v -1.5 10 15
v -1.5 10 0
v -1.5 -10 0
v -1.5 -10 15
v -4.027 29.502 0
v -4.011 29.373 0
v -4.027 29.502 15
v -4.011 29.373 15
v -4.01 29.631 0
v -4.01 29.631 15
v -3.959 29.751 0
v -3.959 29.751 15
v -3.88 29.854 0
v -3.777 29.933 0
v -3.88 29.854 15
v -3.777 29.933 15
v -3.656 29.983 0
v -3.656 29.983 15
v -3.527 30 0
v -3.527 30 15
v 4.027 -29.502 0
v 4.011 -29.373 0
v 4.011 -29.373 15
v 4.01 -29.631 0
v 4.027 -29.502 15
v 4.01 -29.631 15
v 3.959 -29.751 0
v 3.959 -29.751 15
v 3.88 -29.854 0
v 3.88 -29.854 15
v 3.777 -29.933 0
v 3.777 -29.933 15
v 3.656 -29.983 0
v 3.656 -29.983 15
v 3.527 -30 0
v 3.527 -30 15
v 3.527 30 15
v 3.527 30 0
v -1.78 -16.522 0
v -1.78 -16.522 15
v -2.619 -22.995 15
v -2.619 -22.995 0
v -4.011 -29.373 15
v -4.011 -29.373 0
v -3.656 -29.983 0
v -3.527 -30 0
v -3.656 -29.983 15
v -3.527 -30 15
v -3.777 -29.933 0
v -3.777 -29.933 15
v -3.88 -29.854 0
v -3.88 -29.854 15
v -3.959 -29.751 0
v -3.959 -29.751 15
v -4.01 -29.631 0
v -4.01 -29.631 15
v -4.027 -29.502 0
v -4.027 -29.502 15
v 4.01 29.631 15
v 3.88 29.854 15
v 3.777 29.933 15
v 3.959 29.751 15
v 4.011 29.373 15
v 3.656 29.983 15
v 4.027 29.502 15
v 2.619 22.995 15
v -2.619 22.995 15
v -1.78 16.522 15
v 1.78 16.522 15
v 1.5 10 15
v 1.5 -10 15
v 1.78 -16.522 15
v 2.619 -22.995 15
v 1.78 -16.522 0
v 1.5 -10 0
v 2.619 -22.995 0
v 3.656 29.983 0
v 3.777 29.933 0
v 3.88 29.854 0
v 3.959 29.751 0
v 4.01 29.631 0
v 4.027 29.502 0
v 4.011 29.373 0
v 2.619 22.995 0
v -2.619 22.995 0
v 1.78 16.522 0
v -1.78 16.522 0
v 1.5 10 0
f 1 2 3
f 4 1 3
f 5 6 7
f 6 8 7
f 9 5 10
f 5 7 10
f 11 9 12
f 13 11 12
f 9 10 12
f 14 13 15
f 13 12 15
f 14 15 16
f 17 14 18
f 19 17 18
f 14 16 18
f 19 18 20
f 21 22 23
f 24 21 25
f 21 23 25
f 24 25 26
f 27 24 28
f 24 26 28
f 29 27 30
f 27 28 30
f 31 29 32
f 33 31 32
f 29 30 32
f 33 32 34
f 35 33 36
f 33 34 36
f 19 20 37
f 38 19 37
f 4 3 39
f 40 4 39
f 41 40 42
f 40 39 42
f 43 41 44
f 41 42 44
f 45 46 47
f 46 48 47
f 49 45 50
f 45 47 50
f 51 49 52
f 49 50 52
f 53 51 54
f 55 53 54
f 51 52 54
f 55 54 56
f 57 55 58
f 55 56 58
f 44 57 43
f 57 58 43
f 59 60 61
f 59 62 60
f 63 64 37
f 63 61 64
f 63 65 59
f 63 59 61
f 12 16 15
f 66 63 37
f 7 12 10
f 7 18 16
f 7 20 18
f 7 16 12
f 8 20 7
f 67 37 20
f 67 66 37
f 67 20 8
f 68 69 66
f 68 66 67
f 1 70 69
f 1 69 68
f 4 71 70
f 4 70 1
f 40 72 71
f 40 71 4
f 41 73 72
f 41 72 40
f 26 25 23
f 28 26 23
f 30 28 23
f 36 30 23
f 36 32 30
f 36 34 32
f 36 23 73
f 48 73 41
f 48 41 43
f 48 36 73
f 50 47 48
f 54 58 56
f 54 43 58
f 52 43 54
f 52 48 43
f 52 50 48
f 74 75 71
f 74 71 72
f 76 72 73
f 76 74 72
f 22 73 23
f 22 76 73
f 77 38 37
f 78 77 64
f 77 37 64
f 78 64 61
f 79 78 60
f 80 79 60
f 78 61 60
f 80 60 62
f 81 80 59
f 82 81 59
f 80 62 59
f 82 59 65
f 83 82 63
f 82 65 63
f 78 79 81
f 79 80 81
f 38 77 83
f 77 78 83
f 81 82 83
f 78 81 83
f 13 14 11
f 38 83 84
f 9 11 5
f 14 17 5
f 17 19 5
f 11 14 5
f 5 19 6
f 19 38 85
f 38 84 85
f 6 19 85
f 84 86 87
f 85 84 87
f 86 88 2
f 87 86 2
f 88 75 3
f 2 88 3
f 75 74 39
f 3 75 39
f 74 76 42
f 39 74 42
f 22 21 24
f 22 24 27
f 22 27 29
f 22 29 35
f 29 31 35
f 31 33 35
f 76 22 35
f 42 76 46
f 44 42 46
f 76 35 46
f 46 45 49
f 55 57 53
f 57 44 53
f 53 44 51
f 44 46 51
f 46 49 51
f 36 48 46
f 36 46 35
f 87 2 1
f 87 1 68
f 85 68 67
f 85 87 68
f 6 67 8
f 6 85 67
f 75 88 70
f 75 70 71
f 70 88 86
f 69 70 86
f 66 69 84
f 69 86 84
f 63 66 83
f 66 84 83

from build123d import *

# Parameters (mm, degrees)
BOSS_EXTRUDE1_DEPTH = 15
FILLET1_R           = 0.5


with BuildPart() as part:
    # Sketch1 → Boss-Extrude1 (new body)
    with BuildSketch(Plane.XY):
        with BuildLine():
            Line((0, 0), (1.5, 0))
            Line((1.5, 0), (1.5, 10))
            ThreePointArc((1.5, 10), (2.172674131, 20.089300148), (4.178788881, 30))
            Line((4.178788881, 30), (0, 30))
            Line((0, 30), (0, 0))
        make_face()
    boss_extrude1 = extrude(amount=BOSS_EXTRUDE1_DEPTH)

    # Mirror1: Boss-Extrude1 across plane
    add(boss_extrude1.mirror(Plane(origin=(0, 30, 15), x_dir=(0, 0, 1), z_dir=(1, 0, 0))))

    # Mirror6: part across plane


with BuildPart() as part_1:
    add(part.part)
    add(part.part.mirror(Plane(origin=(0, 0, 15), x_dir=(0, 0, 1), z_dir=(0, 1, 0))))

    # Fillet1
    fillet1_edges = [part_1.edges().sort_by_distance(p)[0] for p in [
        (-4.178788881, 30, 7.5),
        (4.178788881, -30, 7.5),
        (-4.178788881, -30, 7.5),
        (4.178788881, 30, 7.5),
    ]]
    fillet(fillet1_edges, radius=FILLET1_R)


solid = part_1.part
